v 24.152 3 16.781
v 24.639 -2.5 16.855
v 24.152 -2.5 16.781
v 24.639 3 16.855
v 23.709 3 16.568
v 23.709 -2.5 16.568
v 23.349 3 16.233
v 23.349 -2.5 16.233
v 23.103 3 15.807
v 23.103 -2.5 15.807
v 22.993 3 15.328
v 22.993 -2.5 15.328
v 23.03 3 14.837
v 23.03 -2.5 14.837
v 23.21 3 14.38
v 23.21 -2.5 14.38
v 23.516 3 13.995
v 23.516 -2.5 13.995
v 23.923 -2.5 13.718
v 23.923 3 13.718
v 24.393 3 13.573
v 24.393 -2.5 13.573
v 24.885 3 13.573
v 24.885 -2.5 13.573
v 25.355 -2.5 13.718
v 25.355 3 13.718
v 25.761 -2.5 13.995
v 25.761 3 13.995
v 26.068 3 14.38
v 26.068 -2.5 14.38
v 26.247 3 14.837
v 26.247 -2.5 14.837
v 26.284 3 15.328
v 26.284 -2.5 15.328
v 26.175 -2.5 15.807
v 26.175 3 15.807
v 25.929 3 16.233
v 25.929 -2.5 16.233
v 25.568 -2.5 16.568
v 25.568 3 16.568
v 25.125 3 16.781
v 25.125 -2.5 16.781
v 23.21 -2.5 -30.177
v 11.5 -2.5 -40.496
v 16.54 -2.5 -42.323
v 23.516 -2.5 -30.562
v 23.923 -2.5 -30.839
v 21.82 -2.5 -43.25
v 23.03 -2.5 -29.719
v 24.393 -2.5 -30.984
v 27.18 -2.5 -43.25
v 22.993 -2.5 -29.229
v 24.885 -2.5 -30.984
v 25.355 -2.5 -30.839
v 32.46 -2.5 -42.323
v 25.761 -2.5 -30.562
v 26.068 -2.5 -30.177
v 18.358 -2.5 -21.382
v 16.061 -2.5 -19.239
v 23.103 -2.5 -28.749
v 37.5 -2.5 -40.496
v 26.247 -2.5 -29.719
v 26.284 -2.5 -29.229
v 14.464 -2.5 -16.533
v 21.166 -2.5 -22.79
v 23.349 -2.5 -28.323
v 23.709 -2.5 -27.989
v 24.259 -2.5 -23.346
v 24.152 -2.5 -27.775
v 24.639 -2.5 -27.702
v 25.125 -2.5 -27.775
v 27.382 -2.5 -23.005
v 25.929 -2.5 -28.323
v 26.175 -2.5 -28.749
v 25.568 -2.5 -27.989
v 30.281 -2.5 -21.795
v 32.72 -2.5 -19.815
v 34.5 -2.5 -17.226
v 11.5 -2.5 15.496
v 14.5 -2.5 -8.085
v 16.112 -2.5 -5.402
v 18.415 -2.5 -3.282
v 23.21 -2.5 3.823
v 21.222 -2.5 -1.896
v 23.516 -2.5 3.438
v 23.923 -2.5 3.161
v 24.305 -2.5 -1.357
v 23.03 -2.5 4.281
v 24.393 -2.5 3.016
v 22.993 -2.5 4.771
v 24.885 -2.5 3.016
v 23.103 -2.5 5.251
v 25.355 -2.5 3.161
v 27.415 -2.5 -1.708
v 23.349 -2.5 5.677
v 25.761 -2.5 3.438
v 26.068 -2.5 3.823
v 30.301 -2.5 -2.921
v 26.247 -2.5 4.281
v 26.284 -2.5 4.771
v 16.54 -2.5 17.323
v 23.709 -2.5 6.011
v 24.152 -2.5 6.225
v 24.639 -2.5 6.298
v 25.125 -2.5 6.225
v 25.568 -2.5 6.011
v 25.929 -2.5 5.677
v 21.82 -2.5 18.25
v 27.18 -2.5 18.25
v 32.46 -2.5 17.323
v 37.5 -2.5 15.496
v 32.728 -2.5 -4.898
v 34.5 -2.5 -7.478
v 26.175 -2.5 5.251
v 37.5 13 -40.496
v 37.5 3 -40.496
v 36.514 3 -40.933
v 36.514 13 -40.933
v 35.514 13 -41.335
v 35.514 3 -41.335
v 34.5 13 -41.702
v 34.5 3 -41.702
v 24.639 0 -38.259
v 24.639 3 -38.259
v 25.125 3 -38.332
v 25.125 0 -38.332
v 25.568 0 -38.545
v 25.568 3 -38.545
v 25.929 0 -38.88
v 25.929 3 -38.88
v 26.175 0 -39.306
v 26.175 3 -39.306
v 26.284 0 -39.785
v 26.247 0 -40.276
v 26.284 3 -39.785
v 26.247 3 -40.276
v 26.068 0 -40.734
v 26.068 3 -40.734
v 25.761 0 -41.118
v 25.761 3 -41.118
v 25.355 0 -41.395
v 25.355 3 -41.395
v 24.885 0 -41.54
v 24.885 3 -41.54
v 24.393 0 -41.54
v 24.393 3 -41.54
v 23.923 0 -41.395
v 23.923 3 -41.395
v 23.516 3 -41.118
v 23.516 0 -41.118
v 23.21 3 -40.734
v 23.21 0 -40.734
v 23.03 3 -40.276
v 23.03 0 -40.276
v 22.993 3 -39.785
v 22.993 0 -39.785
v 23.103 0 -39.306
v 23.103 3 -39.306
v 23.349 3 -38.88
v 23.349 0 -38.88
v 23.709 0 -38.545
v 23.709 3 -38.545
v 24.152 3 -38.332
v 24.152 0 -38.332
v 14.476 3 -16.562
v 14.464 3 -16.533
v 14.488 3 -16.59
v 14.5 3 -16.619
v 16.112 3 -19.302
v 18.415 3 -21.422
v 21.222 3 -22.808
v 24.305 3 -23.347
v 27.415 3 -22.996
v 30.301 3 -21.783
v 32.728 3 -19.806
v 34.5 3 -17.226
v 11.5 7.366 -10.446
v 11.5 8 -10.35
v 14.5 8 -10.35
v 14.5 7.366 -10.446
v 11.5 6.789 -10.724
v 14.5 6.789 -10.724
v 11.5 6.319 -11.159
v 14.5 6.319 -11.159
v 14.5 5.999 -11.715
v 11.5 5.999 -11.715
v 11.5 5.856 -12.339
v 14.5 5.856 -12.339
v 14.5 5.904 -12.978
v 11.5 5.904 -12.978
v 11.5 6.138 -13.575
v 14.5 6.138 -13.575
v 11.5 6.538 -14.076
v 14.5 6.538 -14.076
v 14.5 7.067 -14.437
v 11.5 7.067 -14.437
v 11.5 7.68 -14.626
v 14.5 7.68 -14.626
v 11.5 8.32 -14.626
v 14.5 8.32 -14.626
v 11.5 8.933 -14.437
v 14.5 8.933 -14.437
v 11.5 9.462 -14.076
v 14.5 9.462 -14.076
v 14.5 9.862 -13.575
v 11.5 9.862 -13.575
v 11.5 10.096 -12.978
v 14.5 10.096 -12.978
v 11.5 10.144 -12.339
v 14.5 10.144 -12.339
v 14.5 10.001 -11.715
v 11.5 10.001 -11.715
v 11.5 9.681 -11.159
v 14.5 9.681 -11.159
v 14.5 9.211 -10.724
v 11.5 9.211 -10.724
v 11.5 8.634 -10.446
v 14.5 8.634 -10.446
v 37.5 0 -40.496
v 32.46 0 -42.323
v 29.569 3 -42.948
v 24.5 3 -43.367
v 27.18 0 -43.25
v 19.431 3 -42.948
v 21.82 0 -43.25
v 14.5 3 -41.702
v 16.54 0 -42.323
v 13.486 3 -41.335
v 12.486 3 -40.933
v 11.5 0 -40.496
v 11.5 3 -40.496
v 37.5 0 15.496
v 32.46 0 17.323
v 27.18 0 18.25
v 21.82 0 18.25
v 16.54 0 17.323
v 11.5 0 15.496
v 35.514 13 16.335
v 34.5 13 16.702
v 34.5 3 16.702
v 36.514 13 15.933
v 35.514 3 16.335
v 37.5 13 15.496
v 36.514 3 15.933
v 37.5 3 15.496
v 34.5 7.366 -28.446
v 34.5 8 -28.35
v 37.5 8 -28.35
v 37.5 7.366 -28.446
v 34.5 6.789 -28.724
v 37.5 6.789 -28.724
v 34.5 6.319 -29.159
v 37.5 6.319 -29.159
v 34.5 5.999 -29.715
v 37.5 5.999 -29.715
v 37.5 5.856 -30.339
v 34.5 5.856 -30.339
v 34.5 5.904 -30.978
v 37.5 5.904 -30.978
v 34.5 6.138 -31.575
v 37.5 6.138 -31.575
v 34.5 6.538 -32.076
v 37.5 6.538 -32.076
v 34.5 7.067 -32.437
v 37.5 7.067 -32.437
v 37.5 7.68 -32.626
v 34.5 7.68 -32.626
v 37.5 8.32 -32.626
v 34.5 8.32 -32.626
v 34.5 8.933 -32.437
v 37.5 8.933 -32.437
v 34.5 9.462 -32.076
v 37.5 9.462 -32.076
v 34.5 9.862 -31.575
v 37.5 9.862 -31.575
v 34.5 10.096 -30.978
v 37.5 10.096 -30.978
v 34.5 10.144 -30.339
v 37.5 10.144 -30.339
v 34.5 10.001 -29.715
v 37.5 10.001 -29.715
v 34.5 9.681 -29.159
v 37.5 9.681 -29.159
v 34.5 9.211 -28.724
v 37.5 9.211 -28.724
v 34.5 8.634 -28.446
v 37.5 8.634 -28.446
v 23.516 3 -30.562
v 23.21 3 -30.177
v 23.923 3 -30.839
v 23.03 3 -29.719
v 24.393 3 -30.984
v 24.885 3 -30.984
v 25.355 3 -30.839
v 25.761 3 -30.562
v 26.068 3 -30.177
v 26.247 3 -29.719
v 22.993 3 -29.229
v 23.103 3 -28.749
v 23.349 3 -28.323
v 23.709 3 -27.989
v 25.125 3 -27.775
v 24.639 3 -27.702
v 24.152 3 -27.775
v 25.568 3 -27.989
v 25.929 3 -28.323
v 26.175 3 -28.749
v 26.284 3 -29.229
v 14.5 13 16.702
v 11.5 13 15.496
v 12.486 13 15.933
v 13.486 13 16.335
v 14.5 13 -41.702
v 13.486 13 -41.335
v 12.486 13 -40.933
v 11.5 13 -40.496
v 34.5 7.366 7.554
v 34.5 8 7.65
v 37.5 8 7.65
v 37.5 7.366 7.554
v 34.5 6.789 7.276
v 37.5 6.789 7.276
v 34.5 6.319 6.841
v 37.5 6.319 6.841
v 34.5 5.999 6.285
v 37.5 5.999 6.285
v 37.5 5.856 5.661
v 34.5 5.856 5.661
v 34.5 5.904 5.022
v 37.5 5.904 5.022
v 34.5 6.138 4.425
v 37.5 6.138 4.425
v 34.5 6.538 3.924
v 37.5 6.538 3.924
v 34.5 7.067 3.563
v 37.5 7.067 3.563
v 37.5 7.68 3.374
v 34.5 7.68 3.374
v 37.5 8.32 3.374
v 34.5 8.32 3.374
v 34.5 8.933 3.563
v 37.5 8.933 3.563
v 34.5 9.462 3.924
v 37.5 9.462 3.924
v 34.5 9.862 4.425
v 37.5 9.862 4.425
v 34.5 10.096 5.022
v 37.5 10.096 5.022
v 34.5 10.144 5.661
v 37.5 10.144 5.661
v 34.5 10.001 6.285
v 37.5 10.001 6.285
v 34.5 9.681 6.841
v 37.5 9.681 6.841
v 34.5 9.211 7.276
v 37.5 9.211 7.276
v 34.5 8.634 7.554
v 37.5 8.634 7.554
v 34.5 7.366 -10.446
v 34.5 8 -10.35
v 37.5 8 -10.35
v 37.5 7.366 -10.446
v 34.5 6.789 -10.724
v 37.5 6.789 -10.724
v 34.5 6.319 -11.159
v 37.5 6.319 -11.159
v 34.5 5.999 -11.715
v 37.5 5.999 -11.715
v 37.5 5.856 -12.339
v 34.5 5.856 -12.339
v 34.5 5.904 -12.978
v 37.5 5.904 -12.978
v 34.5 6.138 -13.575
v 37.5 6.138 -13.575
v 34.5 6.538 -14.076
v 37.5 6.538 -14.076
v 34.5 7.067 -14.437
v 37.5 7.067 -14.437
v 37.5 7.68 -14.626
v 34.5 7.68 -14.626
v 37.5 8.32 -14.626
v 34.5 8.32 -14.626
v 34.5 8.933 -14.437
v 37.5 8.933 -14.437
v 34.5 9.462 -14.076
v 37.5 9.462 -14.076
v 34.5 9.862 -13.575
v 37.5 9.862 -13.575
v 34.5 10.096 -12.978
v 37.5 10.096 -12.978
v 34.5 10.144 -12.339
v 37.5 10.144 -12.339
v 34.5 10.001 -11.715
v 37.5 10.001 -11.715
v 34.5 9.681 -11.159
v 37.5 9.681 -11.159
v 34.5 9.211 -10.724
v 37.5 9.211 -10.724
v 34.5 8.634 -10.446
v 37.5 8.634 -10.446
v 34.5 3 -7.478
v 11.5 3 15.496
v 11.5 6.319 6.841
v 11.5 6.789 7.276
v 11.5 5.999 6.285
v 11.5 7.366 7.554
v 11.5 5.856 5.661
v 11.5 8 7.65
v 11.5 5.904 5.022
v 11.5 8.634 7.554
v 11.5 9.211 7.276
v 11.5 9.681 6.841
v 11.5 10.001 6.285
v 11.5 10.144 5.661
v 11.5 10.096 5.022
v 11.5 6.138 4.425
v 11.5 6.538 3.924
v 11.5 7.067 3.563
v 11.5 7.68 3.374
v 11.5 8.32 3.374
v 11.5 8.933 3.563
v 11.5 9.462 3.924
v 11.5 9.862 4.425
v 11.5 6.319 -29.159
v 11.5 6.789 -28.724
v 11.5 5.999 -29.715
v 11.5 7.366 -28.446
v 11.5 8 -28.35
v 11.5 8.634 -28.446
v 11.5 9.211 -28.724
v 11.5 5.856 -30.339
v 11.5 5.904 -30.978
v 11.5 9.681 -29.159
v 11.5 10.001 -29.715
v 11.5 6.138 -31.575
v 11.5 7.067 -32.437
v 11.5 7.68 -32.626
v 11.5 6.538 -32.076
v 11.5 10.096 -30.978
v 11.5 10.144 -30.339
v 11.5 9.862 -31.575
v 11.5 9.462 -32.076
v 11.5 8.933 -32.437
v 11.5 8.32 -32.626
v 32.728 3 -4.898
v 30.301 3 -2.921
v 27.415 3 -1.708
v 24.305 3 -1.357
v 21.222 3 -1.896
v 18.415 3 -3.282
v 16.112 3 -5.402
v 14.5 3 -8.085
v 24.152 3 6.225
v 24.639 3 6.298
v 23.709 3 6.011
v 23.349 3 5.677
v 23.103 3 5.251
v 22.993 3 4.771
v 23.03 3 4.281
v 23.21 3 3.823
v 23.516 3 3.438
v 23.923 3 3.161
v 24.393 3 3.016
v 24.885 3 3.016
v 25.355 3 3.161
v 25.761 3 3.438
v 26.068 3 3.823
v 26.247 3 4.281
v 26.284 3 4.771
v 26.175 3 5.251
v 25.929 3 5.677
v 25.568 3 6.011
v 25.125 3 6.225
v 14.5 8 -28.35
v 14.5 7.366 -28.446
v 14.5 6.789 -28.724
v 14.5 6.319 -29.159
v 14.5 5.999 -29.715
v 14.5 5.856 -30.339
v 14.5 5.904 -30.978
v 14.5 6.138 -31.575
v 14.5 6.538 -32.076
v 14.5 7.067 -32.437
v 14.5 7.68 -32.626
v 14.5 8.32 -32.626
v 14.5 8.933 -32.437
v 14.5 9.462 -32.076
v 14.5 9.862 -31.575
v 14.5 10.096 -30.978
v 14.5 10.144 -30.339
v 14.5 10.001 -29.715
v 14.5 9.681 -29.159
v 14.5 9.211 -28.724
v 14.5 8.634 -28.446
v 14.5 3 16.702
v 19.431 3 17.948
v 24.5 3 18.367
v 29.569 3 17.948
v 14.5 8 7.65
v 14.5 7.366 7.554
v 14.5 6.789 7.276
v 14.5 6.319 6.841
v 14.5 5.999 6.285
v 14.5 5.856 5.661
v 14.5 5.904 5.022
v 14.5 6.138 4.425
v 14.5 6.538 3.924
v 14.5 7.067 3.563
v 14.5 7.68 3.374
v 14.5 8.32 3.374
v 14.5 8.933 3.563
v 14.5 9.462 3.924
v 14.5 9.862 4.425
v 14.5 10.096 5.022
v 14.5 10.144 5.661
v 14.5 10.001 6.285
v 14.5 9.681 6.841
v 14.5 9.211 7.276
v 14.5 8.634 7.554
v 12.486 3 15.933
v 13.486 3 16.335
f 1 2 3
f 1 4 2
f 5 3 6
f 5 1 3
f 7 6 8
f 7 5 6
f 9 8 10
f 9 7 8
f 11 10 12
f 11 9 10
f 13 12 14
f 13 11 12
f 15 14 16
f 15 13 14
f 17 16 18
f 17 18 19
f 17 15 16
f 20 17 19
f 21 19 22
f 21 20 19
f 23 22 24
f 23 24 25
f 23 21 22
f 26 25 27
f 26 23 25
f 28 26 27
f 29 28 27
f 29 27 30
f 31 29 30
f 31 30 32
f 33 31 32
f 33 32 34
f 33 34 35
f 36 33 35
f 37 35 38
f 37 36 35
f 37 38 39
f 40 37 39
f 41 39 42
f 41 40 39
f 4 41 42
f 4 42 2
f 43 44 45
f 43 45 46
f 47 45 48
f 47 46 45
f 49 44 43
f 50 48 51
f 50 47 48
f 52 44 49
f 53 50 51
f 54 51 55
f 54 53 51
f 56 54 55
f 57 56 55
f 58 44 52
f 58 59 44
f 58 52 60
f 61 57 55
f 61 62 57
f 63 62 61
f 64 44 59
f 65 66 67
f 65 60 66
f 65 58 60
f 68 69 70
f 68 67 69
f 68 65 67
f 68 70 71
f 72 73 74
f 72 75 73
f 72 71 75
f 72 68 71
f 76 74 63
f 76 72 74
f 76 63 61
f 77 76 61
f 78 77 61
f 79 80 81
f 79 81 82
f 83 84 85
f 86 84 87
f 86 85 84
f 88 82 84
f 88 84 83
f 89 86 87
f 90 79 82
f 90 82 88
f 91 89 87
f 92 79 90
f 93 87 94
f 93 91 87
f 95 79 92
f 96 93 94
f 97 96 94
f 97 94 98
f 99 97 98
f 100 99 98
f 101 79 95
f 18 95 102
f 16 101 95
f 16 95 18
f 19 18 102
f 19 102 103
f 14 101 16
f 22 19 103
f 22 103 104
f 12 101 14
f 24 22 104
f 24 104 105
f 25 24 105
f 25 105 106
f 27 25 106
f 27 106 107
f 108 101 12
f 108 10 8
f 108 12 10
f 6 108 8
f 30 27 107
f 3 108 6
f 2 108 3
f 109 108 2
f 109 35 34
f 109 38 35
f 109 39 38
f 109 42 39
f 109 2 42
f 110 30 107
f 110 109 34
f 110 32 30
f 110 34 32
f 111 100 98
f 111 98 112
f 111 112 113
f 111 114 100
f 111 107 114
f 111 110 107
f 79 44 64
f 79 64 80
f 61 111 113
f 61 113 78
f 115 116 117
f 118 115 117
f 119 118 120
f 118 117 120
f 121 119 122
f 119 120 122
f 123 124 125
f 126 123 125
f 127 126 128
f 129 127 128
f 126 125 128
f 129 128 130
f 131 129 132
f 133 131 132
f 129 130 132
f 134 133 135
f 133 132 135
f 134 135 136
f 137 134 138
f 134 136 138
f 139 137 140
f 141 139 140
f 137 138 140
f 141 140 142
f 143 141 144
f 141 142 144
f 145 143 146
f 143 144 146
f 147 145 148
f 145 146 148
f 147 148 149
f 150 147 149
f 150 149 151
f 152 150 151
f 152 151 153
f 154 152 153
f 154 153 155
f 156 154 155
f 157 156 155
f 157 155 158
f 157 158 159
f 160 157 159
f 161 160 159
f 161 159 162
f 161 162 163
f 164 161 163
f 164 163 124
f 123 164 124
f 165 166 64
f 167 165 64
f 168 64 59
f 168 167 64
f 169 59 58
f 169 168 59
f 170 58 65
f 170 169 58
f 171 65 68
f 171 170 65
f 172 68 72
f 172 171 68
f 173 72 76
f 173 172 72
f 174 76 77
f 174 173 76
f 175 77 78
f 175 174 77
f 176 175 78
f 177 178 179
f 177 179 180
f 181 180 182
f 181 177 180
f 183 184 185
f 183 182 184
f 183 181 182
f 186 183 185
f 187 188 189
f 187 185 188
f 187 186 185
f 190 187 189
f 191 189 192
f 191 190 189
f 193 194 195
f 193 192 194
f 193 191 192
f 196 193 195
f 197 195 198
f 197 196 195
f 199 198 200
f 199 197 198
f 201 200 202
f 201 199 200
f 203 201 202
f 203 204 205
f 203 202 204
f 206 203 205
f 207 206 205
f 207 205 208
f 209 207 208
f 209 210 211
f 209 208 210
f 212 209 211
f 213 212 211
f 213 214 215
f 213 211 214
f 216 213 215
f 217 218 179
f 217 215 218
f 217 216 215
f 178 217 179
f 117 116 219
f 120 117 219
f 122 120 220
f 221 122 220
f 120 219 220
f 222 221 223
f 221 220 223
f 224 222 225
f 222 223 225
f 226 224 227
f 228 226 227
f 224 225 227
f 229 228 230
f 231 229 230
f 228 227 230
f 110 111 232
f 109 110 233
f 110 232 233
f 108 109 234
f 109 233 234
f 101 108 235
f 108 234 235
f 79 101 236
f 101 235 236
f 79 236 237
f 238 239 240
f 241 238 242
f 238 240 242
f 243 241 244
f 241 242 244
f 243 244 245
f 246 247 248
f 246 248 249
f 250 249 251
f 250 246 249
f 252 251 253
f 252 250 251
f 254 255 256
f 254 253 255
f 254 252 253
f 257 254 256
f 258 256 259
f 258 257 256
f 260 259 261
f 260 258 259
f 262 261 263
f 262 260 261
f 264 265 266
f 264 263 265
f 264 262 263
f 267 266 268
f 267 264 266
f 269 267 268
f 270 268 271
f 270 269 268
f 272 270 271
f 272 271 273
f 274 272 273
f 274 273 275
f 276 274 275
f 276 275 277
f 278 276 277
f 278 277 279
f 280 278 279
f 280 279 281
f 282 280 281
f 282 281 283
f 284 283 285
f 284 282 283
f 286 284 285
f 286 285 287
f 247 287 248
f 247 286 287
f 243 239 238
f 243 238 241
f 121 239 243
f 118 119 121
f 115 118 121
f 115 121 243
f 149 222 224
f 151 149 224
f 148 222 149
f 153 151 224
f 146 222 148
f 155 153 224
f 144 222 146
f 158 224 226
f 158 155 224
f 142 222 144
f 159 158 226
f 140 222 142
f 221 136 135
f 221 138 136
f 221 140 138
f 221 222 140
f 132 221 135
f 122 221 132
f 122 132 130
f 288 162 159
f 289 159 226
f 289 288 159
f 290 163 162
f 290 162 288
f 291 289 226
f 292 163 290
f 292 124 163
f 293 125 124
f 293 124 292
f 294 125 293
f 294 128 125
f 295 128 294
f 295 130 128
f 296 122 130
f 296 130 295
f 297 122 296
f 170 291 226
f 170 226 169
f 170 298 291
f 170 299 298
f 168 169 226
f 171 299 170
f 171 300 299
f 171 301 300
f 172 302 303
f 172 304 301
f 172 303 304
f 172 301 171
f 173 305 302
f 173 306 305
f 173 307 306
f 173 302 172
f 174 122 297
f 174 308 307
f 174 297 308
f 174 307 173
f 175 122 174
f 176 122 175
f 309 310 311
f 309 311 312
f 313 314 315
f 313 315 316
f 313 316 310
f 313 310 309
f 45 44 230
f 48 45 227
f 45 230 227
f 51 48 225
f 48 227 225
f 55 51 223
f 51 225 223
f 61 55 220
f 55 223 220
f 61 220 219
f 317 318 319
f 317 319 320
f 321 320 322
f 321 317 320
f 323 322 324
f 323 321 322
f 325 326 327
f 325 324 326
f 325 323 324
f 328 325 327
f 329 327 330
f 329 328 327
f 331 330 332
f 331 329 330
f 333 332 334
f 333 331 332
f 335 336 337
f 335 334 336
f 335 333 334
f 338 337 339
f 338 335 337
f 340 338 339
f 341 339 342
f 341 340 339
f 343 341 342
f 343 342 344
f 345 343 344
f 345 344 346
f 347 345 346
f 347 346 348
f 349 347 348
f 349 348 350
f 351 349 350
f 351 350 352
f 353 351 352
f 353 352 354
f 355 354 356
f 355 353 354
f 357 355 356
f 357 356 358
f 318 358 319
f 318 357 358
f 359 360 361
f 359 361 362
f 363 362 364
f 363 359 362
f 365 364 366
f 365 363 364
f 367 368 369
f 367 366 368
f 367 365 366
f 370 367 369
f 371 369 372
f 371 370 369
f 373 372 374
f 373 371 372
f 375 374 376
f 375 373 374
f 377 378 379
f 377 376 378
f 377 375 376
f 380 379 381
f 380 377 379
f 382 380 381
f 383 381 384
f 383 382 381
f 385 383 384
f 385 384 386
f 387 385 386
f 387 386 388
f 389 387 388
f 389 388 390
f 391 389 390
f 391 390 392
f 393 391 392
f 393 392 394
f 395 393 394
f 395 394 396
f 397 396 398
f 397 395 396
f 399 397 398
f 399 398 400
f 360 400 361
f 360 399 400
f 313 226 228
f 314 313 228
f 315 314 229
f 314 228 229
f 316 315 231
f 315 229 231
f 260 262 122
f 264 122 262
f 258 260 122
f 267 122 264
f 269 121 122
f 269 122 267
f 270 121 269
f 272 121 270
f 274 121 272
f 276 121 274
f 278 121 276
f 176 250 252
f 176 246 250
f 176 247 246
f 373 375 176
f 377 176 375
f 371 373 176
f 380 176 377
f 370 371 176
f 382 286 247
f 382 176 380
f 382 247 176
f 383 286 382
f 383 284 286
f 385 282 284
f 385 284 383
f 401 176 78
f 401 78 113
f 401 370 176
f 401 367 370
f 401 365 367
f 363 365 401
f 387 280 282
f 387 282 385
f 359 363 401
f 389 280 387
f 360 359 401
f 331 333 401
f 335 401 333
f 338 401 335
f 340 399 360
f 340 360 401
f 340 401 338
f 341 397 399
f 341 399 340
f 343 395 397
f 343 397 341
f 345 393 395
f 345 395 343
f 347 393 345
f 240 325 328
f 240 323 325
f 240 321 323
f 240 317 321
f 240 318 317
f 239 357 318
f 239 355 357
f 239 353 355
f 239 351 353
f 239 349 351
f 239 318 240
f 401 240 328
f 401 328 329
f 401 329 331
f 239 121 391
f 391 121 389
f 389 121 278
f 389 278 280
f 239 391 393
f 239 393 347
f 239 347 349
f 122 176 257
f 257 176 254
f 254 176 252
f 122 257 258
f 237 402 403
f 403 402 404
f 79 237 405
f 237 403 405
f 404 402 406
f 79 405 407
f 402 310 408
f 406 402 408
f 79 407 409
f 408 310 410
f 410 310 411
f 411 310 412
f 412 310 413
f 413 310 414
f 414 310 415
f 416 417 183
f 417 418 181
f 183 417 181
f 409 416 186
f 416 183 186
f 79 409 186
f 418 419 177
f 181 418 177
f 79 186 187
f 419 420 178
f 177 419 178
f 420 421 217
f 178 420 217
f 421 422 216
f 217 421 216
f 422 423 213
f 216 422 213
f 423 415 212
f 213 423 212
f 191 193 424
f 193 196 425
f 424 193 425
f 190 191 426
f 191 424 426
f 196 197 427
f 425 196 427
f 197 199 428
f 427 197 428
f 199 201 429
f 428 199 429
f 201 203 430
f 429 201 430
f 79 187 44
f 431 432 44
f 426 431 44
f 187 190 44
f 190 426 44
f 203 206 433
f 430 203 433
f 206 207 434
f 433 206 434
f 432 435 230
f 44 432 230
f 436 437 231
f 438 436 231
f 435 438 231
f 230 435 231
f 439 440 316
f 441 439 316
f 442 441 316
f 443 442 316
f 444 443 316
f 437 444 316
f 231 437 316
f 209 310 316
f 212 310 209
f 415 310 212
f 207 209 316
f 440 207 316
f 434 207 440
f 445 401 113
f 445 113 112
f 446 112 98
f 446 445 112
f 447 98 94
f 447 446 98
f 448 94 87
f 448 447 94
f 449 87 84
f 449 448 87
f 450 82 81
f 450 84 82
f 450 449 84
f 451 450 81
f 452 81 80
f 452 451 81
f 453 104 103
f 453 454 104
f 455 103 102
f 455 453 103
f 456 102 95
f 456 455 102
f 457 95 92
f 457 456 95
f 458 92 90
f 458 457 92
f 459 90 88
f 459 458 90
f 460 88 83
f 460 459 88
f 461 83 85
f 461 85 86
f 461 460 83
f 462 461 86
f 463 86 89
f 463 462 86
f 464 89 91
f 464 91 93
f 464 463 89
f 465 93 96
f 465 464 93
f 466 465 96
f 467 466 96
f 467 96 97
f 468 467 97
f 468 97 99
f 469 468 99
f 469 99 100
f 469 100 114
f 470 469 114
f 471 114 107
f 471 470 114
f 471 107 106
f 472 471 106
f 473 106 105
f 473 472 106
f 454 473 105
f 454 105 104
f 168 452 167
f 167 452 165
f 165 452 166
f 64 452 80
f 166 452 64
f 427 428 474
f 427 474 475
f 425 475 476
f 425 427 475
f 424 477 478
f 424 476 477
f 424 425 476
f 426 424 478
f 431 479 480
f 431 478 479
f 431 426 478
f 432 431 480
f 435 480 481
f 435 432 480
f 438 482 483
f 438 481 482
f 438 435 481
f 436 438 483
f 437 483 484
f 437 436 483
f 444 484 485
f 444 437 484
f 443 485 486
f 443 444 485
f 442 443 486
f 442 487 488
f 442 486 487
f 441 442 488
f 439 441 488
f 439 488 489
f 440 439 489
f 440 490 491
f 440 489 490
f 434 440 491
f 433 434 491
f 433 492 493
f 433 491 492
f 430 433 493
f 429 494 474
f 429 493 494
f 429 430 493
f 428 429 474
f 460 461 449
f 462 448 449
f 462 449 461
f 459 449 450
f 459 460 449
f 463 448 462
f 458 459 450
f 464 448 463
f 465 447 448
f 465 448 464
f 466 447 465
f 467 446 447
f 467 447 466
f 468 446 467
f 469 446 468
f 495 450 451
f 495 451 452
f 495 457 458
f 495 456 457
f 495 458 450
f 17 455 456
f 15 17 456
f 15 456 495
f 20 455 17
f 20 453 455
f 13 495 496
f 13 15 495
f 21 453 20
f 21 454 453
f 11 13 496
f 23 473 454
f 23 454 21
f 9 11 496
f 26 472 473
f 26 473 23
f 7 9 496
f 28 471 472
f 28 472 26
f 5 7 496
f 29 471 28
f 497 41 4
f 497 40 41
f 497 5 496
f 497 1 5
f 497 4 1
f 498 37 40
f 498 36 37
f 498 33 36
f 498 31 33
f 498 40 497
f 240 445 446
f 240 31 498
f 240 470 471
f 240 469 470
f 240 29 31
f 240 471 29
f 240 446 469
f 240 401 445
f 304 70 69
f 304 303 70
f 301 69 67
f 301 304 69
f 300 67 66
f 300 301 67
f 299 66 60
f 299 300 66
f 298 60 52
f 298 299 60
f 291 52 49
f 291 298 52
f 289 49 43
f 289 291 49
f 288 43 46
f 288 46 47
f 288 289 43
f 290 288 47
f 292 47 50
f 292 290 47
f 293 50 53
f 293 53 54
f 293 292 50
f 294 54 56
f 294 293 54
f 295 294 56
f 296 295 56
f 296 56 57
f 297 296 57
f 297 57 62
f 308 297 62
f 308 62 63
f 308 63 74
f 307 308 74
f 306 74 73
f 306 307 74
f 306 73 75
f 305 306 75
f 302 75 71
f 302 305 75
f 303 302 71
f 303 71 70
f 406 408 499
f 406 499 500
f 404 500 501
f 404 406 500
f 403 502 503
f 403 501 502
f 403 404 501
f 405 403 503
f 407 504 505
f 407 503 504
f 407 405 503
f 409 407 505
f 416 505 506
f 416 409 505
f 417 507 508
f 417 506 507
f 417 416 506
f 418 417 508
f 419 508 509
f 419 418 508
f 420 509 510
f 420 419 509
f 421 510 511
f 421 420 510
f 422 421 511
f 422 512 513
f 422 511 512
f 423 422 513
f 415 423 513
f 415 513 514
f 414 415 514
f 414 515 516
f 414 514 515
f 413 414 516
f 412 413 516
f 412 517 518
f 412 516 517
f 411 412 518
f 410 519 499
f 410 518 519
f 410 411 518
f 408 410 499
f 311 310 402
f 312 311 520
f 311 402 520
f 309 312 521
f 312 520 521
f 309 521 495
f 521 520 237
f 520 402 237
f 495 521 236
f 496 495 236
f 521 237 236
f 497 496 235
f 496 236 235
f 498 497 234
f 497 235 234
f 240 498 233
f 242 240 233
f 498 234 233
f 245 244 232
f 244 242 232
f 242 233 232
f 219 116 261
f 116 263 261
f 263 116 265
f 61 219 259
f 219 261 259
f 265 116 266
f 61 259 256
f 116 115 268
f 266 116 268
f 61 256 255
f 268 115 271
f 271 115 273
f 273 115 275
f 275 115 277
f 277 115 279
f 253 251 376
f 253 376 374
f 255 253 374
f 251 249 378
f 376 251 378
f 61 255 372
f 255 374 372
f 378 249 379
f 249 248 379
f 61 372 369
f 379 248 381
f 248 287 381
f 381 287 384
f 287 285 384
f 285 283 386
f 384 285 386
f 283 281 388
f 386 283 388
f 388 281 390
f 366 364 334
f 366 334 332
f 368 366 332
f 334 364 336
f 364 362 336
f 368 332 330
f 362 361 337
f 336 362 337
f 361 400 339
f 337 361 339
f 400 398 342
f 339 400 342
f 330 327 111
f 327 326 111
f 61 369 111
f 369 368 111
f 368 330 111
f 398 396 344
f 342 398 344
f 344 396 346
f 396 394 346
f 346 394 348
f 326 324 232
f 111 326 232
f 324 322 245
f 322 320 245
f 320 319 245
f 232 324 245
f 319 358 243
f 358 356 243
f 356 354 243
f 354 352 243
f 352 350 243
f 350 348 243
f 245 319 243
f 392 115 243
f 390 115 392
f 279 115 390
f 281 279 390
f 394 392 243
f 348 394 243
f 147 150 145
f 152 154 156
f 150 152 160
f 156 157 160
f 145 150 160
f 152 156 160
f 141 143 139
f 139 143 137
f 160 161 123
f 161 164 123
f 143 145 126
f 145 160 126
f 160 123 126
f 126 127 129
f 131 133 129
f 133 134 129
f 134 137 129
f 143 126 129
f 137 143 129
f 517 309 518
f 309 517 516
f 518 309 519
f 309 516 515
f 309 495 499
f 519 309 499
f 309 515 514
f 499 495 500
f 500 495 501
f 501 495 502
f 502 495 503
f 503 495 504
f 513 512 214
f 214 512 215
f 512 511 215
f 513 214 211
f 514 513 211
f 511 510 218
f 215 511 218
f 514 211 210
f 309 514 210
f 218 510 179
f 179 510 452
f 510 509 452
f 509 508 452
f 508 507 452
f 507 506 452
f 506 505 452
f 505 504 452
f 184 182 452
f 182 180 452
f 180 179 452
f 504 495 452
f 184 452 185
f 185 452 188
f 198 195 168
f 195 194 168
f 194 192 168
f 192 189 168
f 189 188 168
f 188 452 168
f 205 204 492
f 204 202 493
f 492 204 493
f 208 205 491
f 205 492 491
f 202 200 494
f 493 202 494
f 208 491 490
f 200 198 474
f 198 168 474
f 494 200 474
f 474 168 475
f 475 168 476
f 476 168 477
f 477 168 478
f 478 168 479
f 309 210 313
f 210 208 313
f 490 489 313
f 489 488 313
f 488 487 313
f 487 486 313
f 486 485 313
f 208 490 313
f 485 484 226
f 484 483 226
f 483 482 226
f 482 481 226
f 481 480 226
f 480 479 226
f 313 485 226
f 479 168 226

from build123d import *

# Parameters (mm, degrees)
SKETCH1_R                = 28
BOSS_EXTRUDE1_DEPTH      = 3
SKETCH2_R                = 1.625
CUT_EXTRUDE1_DEPTH       = 3
BOSS_EXTRUDE4_START      = 3
BOSS_EXTRUDE4_OUTLINE_R  = 1.625
BOSS_EXTRUDE4_DEPTH      = 70
BOSS_EXTRUDE6_DEPTH      = 7
CUT_EXTRUDE13_START      = -10
CUT_EXTRUDE13_DEPTH      = 10
SKETCH14_R               = 6
CUT_EXTRUDE7_DEPTH       = 4
SKETCH15_R               = 5
CUT_EXTRUDE8_DEPTH       = 37
SKETCH17_R               = 2.15
CUT_EXTRUDE10_DEPTH      = 15.8
CUT_EXTRUDE11_DEPTH      = 5
CUT_EXTRUDE12_START      = -3
CUT_EXTRUDE12_DEPTH      = 3
SKETCH21_W               = 20.621892052
SKETCH21_H               = 10
BOSS_EXTRUDE7_DEPTH      = 7
SKETCH23_R               = 2.15
CUT_EXTRUDE17_DEPTH      = 23
SKETCH25_W               = 2
SKETCH25_H               = 4.7
CUT_EXTRUDE19_DEPTH      = 5
SKETCH26_W               = 20.621892052
SKETCH26_H               = 58
CUT_EXTRUDE21_DEPTH      = 5
CUT_EXTRUDE22_DEPTH      = 5
SKETCH41_R               = 1.625
CUT_EXTRUDE23_DEPTH      = 70
CUT_EXTRUDE24_START      = -39
CUT_EXTRUDE24_DEPTH      = 39
BOSS_EXTRUDE12_START     = -3
SKETCH43_R               = 30.866648668
BOSS_EXTRUDE12_DEPTH     = 3
BOSS_EXTRUDE13_DEPTH     = 70
BOSS_EXTRUDE14_DEPTH     = 70
SKETCH47_R               = 1.65
SKETCH47_R_2             = 1.625
CUT_EXTRUDE26_DEPTH      = 39
SKETCH48_R               = 5
CUT_EXTRUDE27_DEPTH      = 39
SKETCH49_R               = 5
CUT_EXTRUDE28_DEPTH      = 10
CUT_EXTRUDE29_START      = -4
SKETCH50_R               = 6
CUT_EXTRUDE29_DEPTH      = 4
SKETCH51_R               = 3
CUT_EXTRUDE30_DEPTH      = 2.5
CUT_EXTRUDE31_DEPTH      = 81
CUT_EXTRUDE31_DEPTH_BACK = 10
BOSS_EXTRUDE15_DEPTH     = 10
CUT_EXTRUDE32_DEPTH      = 28
CUT_EXTRUDE32_DEPTH_BACK = 12
SKETCH54_R               = 2.15
SKETCH55_R               = 1.65
BOSS_EXTRUDE16_DEPTH     = 2.5
CUT_EXTRUDE33_DEPTH      = 10


# Read off the part's stored shape, not the designer's step: Boss-Extrude4, Cut-Extrude13
with BuildPart() as part:
    # Sketch1 → Boss-Extrude1 (new body)
    with BuildSketch(Plane(origin=(0, 0, 0), x_dir=(1, 0, 0), z_dir=(0, 1, 0))):
        with Locations(Location((20, 12.5, 0), (0, 0, 270))):
            Circle(SKETCH1_R)
    extrude(amount=BOSS_EXTRUDE1_DEPTH)

    # Sketch2 → Cut-Extrude1 (cut)
    with BuildSketch(Plane(origin=(0, 3, 0), x_dir=(1, 0, 0), z_dir=(0, 1, 0))):
        with Locations(Location((20, 19.5, 0), (0, 0, 270))):
            Circle(SKETCH2_R)
        with Locations(Location((20, 5.5, 0), (0, 0, 270))):
            Circle(SKETCH2_R)
        with Locations(Location((20, 12.5, 0), (0, 0, 270))):
            Circle(SKETCH2_R)
    extrude(amount=-CUT_EXTRUDE1_DEPTH, mode=Mode.SUBTRACT)

    # Boss-Extrude4 outline → Boss-Extrude4 (add)
    with BuildSketch(Plane(origin=(0, 0, 0), x_dir=(1, 0, 0), z_dir=(0, 1, 0)).offset(BOSS_EXTRUDE4_START)):
        with BuildLine():
            ThreePointArc((3.5, -10.121892052), (48, 12.5), (3.5, 35.121892052))
            Line((3.5, 35.121892052), (3.5, -10.121892052))
        make_face()
        with Locations((20, 5.5)):
            Circle(BOSS_EXTRUDE4_OUTLINE_R, mode=Mode.SUBTRACT)
        with Locations((20, 12.5)):
            Circle(BOSS_EXTRUDE4_OUTLINE_R, mode=Mode.SUBTRACT)
        with Locations((20, 19.5)):
            Circle(BOSS_EXTRUDE4_OUTLINE_R, mode=Mode.SUBTRACT)
    extrude(amount=BOSS_EXTRUDE4_DEPTH)

    # Sketch13 → Boss-Extrude6 (add)
    with BuildSketch(Plane.ZY.offset(-3.5)):
        Polygon((-10, 23), (10, 23), (10.121892052, 23), (10.121892052, 15), (10, 15), (-10, 15), (-10.5, 15), (-10.5, 23), align=None)
    extrude(amount=BOSS_EXTRUDE6_DEPTH)

    # Cut-Extrude13 outline → Cut-Extrude13 (cut)
    with BuildSketch(Plane.ZY.offset(-3.5).offset(CUT_EXTRUDE13_START)):
        with BuildLine():
            Line((-10.5, 33), (-10.5, 23))
            Line((-10.5, 23), (10.121892052, 23))
            Line((10.121892052, 23), (10.121892052, 35.792364821))
            ThreePointArc((10.121892052, 35.792364821), (-1.408923961, 43.405043646), (-10.5, 33))
        make_face()
    extrude(amount=CUT_EXTRUDE13_DEPTH, mode=Mode.SUBTRACT)

    # Sketch14 → Cut-Extrude7 (cut)
    with BuildSketch(Plane.ZY.offset(-3.5)):
        with Locations((-22.981333294, 52.283628291)):
            Circle(SKETCH14_R)
    extrude(amount=-CUT_EXTRUDE7_DEPTH, mode=Mode.SUBTRACT)

    # Sketch15 → Cut-Extrude8 (cut)
    with BuildSketch(Plane.ZY.offset(-7.5)):
        with Locations((-22.981333294, 52.283628291)):
            Circle(SKETCH15_R)
    extrude(amount=-CUT_EXTRUDE8_DEPTH, mode=Mode.SUBTRACT)

    # Sketch17 → Cut-Extrude10 (cut)
    with BuildSketch(Plane.ZY.offset(3.5)):
        with Locations((-5, 18.2)):
            Circle(SKETCH17_R)
        with Locations((5, 18.2)):
            Circle(SKETCH17_R)
    extrude(amount=-CUT_EXTRUDE10_DEPTH, mode=Mode.SUBTRACT)

    # Sketch18 → Cut-Extrude11 (cut)
    with BuildSketch(Plane.ZY.offset(3.5)):
        Polygon((-0.189053974, 23), (1, 23), (1, 18), (-1, 18), (-1, 23), align=None)
    extrude(amount=-CUT_EXTRUDE11_DEPTH, mode=Mode.SUBTRACT)

    # Sketch19 → Cut-Extrude12 (cut)
    with BuildSketch(Plane.ZY.offset(-3.5).offset(CUT_EXTRUDE12_START)):
        with BuildLine():
            Line((10.121892052, 63), (10.121892052, 35.792364821))
            ThreePointArc((10.121892052, 35.792364821), (-1.408923961, 43.405043646), (-10.5, 33))
            Line((-10.5, 33), (-10.5, 62))
            Line((-10.5, 62), (-10.5, 63))
            Line((-10.5, 63), (10.121892052, 63))
        make_face()
    extrude(amount=CUT_EXTRUDE12_DEPTH, mode=Mode.SUBTRACT)

    # Sketch21 → Boss-Extrude7 (add)
    with BuildSketch(Plane.ZY.offset(-3.5)):
        with Locations((-0.189053974, 68)):
            Rectangle(SKETCH21_W, SKETCH21_H)
    extrude(amount=BOSS_EXTRUDE7_DEPTH)

    # Sketch23 → Cut-Extrude17 (cut)
    with BuildSketch(Plane.ZY.offset(3.5)):
        with Locations((-5, 67.7)):
            Circle(SKETCH23_R)
        with Locations((5, 67.7)):
            Circle(SKETCH23_R)
    extrude(amount=-CUT_EXTRUDE17_DEPTH, mode=Mode.SUBTRACT)

    # Sketch25 → Cut-Extrude19 (cut)
    with BuildSketch(Plane.ZY.offset(3.5)):
        with Locations((0, 65.35)):
            Rectangle(SKETCH25_W, SKETCH25_H)
    extrude(amount=-CUT_EXTRUDE19_DEPTH, mode=Mode.SUBTRACT)

    # Sketch26 → Cut-Extrude21 (cut)
    with BuildSketch(Plane.ZY.offset(3.5)):
        with Locations((-0.189053974, 44)):
            Rectangle(SKETCH26_W, SKETCH26_H)
    extrude(amount=-CUT_EXTRUDE21_DEPTH, mode=Mode.SUBTRACT)

    # Sketch27 → Cut-Extrude22 (cut)
    with BuildSketch(Plane.ZY.offset(-6.5)):
        Polygon((10.121892052, 63), (-10.5, 63), (-10.5, 33), (10.121892052, 35.792364821), align=None)
    extrude(amount=-CUT_EXTRUDE22_DEPTH, mode=Mode.SUBTRACT)

    # Sketch41 → Cut-Extrude23 (cut)
    with BuildSketch(Plane(origin=(0, 73, 0), x_dir=(1, 0, 0), z_dir=(0, 1, 0))):
        with BuildLine():
            Line((11.5, 39.178643144), (11.5, 10.5))
            Line((11.5, 10.5), (11.5, -14.178643144))
            ThreePointArc((11.5, -14.178643144), (48, 12.5), (11.5, 39.178643144))
        make_face()
        with Locations(Location((20, 5.5, 0), (0, 0, 270))):
            Circle(SKETCH41_R, mode=Mode.SUBTRACT)
        with Locations(Location((20, 12.5, 0), (0, 0, 270))):
            Circle(SKETCH41_R, mode=Mode.SUBTRACT)
        with Locations(Location((20, 19.5, 0), (0, 0, 270))):
            Circle(SKETCH41_R, mode=Mode.SUBTRACT)
    extrude(amount=-CUT_EXTRUDE23_DEPTH, mode=Mode.SUBTRACT)

    # Sketch42 → Cut-Extrude24 (cut)
    with BuildSketch(Plane(origin=(0, 3, 0), x_dir=(1, 0, 0), z_dir=(0, 1, 0)).offset(CUT_EXTRUDE24_START)):
        with BuildLine():
            ThreePointArc((3.5, 35.121892052), (-6.366648668, 12.5), (3.5, -10.121892052))
            ThreePointArc((3.5, -10.121892052), (-8, 12.5), (3.5, 35.121892052))
        make_face()
    extrude(amount=CUT_EXTRUDE24_DEPTH, mode=Mode.SUBTRACT)

    # Sketch43 → Boss-Extrude12 (add)
    with BuildSketch(Plane(origin=(0, 3, 0), x_dir=(1, 0, 0), z_dir=(0, 1, 0)).offset(BOSS_EXTRUDE12_START)):
        with Locations(Location((24.5, 12.5, 0), (0, 0, 270))):
            Circle(SKETCH43_R)
    extrude(amount=BOSS_EXTRUDE12_DEPTH)

    # Sketch45 → Boss-Extrude13 (add)
    with BuildSketch(Plane(origin=(0, 3, 0), x_dir=(1, 0, 0), z_dir=(0, 1, 0))):
        with BuildLine():
            Line((11.5, 40.495535358), (11.5, 39.178643144))
            ThreePointArc((11.5, 39.178643144), (7.336497035, 37.472698946), (3.5, 35.121892052))
            ThreePointArc((3.5, 35.121892052), (7.288985777, 38.12286068), (11.5, 40.495535358))
        make_face()
        with BuildLine():
            Line((11.5, -14.178643144), (11.5, -15.495535358))
            ThreePointArc((11.5, -15.495535358), (7.288985777, -13.12286068), (3.5, -10.121892052))
            ThreePointArc((3.5, -10.121892052), (7.336497035, -12.472698946), (11.5, -14.178643144))
        make_face()
    extrude(amount=BOSS_EXTRUDE13_DEPTH)

    # Sketch46 → Boss-Extrude14 (add)
    with BuildSketch(Plane(origin=(0, 3, 0), x_dir=(1, 0, 0), z_dir=(0, 1, 0))):
        with BuildLine():
            Line((37.5, 40.495535358), (37.5, 12.5))
            Line((37.5, 12.5), (37.5, -15.495535358))
            ThreePointArc((37.5, -15.495535358), (41.711014223, -13.12286068), (45.5, -10.121892052))
            Line((45.5, -10.121892052), (45.5, 12.5))
            Line((45.5, 12.5), (45.5, 35.121892052))
            ThreePointArc((45.5, 35.121892052), (41.711014223, 38.12286068), (37.5, 40.495535358))
        make_face()
    extrude(amount=BOSS_EXTRUDE14_DEPTH)

    # Sketch47 → Cut-Extrude26 (cut)
    with BuildSketch(Plane(origin=(0, 3, 0), x_dir=(1, 0, 0), z_dir=(0, 1, 0))):
        with Locations(Location((24.638783134, 29.352080003, 0), (0, 0, 270))):
            Circle(SKETCH47_R)
        with Locations(Location((24.638783134, 19.352080003, 0), (0, 0, 270))):
            Circle(SKETCH47_R)
        with Locations(Location((24.638783134, 12.352080003, 0), (0, 0, 270))):
            Circle(SKETCH47_R)
        with Locations(Location((24.638783134, -4.647919997, 0), (0, 0, 270))):
            Circle(SKETCH47_R)
        with Locations(Location((24.638783134, 5.352080003, 0), (0, 0, 270))):
            Circle(SKETCH47_R)
        with Locations(Location((48.503562926, 26.13041704, 0), (0, 0, 270))):
            Circle(SKETCH47_R)
        with Locations(Location((48.503562926, -1.426257034, 0), (0, 0, 270))):
            Circle(SKETCH47_R)
        with Locations(Location((24.638783134, -15.204594071, 0), (0, 0, 270))):
            Circle(SKETCH47_R)
        with Locations(Location((0.774003343, -1.426257034, 0), (0, 0, 270))):
            Circle(SKETCH47_R)
        with Locations(Location((0.774003343, 26.13041704, 0), (0, 0, 270))):
            Circle(SKETCH47_R)
        with Locations(Location((24.638783134, 39.908754076, 0), (0, 0, 270))):
            Circle(SKETCH47_R)
        with Locations(Location((-2.490624188, 12.352080003, 0), (0, 0, 270))):
            Circle(SKETCH47_R_2)
        with Locations(Location((51.768190456, 12.352080003, 0), (0, 0, 270))):
            Circle(SKETCH47_R_2)
        with Locations(Location((31.638783134, 12.352080003, 0), (0, 0, 270))):
            Circle(SKETCH47_R)
        with Locations(Location((17.638783134, 12.352080003, 0), (0, 0, 270))):
            Circle(SKETCH47_R)
    extrude(amount=-CUT_EXTRUDE26_DEPTH, mode=Mode.SUBTRACT)

    # Sketch48 → Cut-Extrude27 (cut)
    with BuildSketch(Plane.ZY.offset(-7.5)):
        with Locations((-22.981333294, 52.283628291)):
            Circle(SKETCH48_R)
    extrude(amount=-CUT_EXTRUDE27_DEPTH, mode=Mode.SUBTRACT)

    # Sketch49 → Cut-Extrude28 (cut)
    with BuildSketch(Plane(origin=(45.5, 0, 0), x_dir=(0, 0, -1), z_dir=(1, 0, 0))):
        with Locations((0, 33)):
            Circle(SKETCH49_R)
    extrude(amount=-CUT_EXTRUDE28_DEPTH, mode=Mode.SUBTRACT)

    # Sketch50 → Cut-Extrude29 (cut)
    with BuildSketch(Plane(origin=(45.5, 0, 0), x_dir=(0, 0, -1), z_dir=(1, 0, 0)).offset(CUT_EXTRUDE29_START)):
        with Locations((0, 33)):
            Circle(SKETCH50_R)
        with Locations(Location((22.981333294, 52.283628291, 0), (0, 0, 180))):
            Circle(SKETCH50_R)
    extrude(amount=CUT_EXTRUDE29_DEPTH, mode=Mode.SUBTRACT)

    # Sketch51 → Cut-Extrude30 (cut)
    with BuildSketch(Plane(origin=(11.5, 0, 0), x_dir=(0, 0, -1), z_dir=(1, 0, 0))):
        with Locations((-5, 18.2)):
            Circle(SKETCH51_R)
        with Locations((5, 18.2)):
            Circle(SKETCH51_R)
        with Locations((-5, 67.7)):
            Circle(SKETCH51_R)
        with Locations((5, 67.7)):
            Circle(SKETCH51_R)
    extrude(amount=-CUT_EXTRUDE30_DEPTH, mode=Mode.SUBTRACT)

    # Sketch52 → Cut-Extrude31 (cut, two sides: drawn at the far end of the back side and taken through both)
    with BuildSketch(Plane(origin=(0, 3, 0), x_dir=(1, 0, 0), z_dir=(0, 1, 0)).offset(-CUT_EXTRUDE31_DEPTH_BACK)):
        with BuildLine():
            Line((11.5, 40.495535358), (11.5, -15.495535358))
            ThreePointArc((11.5, -15.495535358), (-6.366648668, 12.5), (11.5, 40.495535358))
        make_face()
        with BuildLine():
            Line((37.5, 40.495535358), (37.5, -15.495535358))
            ThreePointArc((37.5, -15.495535358), (55.366648668, 12.5), (37.5, 40.495535358))
        make_face()
    extrude(amount=CUT_EXTRUDE31_DEPTH + CUT_EXTRUDE31_DEPTH_BACK, mode=Mode.SUBTRACT)


with BuildPart() as body_2:
    # of the pieces the cut leaves, the one that is kept (cut_extrude31_keep)
    add(part.part.solids().sort_by_distance((11.5, 0, 15.495535358))[0])

    # Sketch53 → Boss-Extrude15 (add)
    with BuildSketch(Plane(origin=(0, 3, 0), x_dir=(1, 0, 0), z_dir=(0, 1, 0))):
        with BuildLine():
            ThreePointArc((14.5, 41.701883501), (12.984192648, 41.138019852), (11.5, 40.495535358))
            Line((11.5, 40.495535358), (11.5, -15.495535358))
            ThreePointArc((11.5, -15.495535358), (12.984192648, -16.138019852), (14.5, -16.701883501))
            Line((14.5, -16.701883501), (14.5, 12.5))
            Line((14.5, 12.5), (14.5, 41.701883501))
        make_face()
        with BuildLine():
            ThreePointArc((37.5, 40.495535358), (36.015807352, 41.138019852), (34.5, 41.701883501))
            Line((34.5, 41.701883501), (34.5, 12.5))
            Line((34.5, 12.5), (34.5, -16.701883501))
            ThreePointArc((34.5, -16.701883501), (36.015807352, -16.138019852), (37.5, -15.495535358))
            Line((37.5, -15.495535358), (37.5, 40.495535358))
        make_face()
    extrude(amount=BOSS_EXTRUDE15_DEPTH)

    # Sketch54 → Cut-Extrude32 (cut, two sides: drawn at the far end of the back side and taken through both)
    with BuildSketch(Plane(origin=(14.5, 0, 0), x_dir=(0, 0, -1), z_dir=(1, 0, 0)).offset(-CUT_EXTRUDE32_DEPTH_BACK)):
        with Locations(Location((-5.5, 8, 0), (0, 0, 180))):
            Circle(SKETCH54_R)
        with Locations(Location((12.5, 8, 0), (0, 0, 180))):
            Circle(SKETCH54_R)
        with Locations(Location((30.5, 8, 0), (0, 0, 180))):
            Circle(SKETCH54_R)
    extrude(amount=CUT_EXTRUDE32_DEPTH + CUT_EXTRUDE32_DEPTH_BACK, mode=Mode.SUBTRACT)

    # Sketch55 → Boss-Extrude16 (add)
    with BuildSketch(Plane.XZ):
        with BuildLine():
            Line((11.5, 15.495535358), (11.5, -40.495535358))
            ThreePointArc((11.5, -40.495535358), (24.5, -43.366648668), (37.5, -40.495535358))
            Line((37.5, -40.495535358), (37.5, 15.495535358))
            ThreePointArc((37.5, 15.495535358), (24.5, 18.366648668), (11.5, 15.495535358))
        make_face()
        with Locations(Location((17.638783134, -12.352080003, 0), (0, 0, 90))):
            Circle(SKETCH55_R, mode=Mode.SUBTRACT)
        with Locations(Location((24.638783134, 15.204594071, 0), (0, 0, 90))):
            Circle(SKETCH55_R, mode=Mode.SUBTRACT)
        with Locations(Location((24.638783134, 4.647919997, 0), (0, 0, 90))):
            Circle(SKETCH55_R, mode=Mode.SUBTRACT)
        with Locations(Location((24.638783134, -5.352080003, 0), (0, 0, 90))):
            Circle(SKETCH55_R, mode=Mode.SUBTRACT)
        with Locations(Location((24.638783134, -12.352080003, 0), (0, 0, 90))):
            Circle(SKETCH55_R, mode=Mode.SUBTRACT)
        with Locations(Location((31.638783134, -12.352080003, 0), (0, 0, 90))):
            Circle(SKETCH55_R, mode=Mode.SUBTRACT)
        with Locations(Location((24.638783134, -19.352080003, 0), (0, 0, 90))):
            Circle(SKETCH55_R, mode=Mode.SUBTRACT)
        with Locations(Location((24.638783134, -29.352080003, 0), (0, 0, 90))):
            Circle(SKETCH55_R, mode=Mode.SUBTRACT)
    extrude(amount=BOSS_EXTRUDE16_DEPTH)

    # Sketch56 → Cut-Extrude33 (cut)
    with BuildSketch(Plane(origin=(0, 3, 0), x_dir=(1, 0, 0), z_dir=(0, 1, 0))):
        with BuildLine():
            Line((14.5, 8.085339261), (14.464347058, 16.533090711))
            ThreePointArc((14.464347058, 16.533090711), (24.258515067, 23.345505138), (34.5, 17.226133955))
            Line((34.5, 17.226133955), (34.5, 7.478026051))
            ThreePointArc((34.5, 7.478026051), (24.304914759, 1.357147902), (14.5, 8.085339261))
        make_face()
    extrude(amount=-CUT_EXTRUDE33_DEPTH, mode=Mode.SUBTRACT)


solid = body_2.part
